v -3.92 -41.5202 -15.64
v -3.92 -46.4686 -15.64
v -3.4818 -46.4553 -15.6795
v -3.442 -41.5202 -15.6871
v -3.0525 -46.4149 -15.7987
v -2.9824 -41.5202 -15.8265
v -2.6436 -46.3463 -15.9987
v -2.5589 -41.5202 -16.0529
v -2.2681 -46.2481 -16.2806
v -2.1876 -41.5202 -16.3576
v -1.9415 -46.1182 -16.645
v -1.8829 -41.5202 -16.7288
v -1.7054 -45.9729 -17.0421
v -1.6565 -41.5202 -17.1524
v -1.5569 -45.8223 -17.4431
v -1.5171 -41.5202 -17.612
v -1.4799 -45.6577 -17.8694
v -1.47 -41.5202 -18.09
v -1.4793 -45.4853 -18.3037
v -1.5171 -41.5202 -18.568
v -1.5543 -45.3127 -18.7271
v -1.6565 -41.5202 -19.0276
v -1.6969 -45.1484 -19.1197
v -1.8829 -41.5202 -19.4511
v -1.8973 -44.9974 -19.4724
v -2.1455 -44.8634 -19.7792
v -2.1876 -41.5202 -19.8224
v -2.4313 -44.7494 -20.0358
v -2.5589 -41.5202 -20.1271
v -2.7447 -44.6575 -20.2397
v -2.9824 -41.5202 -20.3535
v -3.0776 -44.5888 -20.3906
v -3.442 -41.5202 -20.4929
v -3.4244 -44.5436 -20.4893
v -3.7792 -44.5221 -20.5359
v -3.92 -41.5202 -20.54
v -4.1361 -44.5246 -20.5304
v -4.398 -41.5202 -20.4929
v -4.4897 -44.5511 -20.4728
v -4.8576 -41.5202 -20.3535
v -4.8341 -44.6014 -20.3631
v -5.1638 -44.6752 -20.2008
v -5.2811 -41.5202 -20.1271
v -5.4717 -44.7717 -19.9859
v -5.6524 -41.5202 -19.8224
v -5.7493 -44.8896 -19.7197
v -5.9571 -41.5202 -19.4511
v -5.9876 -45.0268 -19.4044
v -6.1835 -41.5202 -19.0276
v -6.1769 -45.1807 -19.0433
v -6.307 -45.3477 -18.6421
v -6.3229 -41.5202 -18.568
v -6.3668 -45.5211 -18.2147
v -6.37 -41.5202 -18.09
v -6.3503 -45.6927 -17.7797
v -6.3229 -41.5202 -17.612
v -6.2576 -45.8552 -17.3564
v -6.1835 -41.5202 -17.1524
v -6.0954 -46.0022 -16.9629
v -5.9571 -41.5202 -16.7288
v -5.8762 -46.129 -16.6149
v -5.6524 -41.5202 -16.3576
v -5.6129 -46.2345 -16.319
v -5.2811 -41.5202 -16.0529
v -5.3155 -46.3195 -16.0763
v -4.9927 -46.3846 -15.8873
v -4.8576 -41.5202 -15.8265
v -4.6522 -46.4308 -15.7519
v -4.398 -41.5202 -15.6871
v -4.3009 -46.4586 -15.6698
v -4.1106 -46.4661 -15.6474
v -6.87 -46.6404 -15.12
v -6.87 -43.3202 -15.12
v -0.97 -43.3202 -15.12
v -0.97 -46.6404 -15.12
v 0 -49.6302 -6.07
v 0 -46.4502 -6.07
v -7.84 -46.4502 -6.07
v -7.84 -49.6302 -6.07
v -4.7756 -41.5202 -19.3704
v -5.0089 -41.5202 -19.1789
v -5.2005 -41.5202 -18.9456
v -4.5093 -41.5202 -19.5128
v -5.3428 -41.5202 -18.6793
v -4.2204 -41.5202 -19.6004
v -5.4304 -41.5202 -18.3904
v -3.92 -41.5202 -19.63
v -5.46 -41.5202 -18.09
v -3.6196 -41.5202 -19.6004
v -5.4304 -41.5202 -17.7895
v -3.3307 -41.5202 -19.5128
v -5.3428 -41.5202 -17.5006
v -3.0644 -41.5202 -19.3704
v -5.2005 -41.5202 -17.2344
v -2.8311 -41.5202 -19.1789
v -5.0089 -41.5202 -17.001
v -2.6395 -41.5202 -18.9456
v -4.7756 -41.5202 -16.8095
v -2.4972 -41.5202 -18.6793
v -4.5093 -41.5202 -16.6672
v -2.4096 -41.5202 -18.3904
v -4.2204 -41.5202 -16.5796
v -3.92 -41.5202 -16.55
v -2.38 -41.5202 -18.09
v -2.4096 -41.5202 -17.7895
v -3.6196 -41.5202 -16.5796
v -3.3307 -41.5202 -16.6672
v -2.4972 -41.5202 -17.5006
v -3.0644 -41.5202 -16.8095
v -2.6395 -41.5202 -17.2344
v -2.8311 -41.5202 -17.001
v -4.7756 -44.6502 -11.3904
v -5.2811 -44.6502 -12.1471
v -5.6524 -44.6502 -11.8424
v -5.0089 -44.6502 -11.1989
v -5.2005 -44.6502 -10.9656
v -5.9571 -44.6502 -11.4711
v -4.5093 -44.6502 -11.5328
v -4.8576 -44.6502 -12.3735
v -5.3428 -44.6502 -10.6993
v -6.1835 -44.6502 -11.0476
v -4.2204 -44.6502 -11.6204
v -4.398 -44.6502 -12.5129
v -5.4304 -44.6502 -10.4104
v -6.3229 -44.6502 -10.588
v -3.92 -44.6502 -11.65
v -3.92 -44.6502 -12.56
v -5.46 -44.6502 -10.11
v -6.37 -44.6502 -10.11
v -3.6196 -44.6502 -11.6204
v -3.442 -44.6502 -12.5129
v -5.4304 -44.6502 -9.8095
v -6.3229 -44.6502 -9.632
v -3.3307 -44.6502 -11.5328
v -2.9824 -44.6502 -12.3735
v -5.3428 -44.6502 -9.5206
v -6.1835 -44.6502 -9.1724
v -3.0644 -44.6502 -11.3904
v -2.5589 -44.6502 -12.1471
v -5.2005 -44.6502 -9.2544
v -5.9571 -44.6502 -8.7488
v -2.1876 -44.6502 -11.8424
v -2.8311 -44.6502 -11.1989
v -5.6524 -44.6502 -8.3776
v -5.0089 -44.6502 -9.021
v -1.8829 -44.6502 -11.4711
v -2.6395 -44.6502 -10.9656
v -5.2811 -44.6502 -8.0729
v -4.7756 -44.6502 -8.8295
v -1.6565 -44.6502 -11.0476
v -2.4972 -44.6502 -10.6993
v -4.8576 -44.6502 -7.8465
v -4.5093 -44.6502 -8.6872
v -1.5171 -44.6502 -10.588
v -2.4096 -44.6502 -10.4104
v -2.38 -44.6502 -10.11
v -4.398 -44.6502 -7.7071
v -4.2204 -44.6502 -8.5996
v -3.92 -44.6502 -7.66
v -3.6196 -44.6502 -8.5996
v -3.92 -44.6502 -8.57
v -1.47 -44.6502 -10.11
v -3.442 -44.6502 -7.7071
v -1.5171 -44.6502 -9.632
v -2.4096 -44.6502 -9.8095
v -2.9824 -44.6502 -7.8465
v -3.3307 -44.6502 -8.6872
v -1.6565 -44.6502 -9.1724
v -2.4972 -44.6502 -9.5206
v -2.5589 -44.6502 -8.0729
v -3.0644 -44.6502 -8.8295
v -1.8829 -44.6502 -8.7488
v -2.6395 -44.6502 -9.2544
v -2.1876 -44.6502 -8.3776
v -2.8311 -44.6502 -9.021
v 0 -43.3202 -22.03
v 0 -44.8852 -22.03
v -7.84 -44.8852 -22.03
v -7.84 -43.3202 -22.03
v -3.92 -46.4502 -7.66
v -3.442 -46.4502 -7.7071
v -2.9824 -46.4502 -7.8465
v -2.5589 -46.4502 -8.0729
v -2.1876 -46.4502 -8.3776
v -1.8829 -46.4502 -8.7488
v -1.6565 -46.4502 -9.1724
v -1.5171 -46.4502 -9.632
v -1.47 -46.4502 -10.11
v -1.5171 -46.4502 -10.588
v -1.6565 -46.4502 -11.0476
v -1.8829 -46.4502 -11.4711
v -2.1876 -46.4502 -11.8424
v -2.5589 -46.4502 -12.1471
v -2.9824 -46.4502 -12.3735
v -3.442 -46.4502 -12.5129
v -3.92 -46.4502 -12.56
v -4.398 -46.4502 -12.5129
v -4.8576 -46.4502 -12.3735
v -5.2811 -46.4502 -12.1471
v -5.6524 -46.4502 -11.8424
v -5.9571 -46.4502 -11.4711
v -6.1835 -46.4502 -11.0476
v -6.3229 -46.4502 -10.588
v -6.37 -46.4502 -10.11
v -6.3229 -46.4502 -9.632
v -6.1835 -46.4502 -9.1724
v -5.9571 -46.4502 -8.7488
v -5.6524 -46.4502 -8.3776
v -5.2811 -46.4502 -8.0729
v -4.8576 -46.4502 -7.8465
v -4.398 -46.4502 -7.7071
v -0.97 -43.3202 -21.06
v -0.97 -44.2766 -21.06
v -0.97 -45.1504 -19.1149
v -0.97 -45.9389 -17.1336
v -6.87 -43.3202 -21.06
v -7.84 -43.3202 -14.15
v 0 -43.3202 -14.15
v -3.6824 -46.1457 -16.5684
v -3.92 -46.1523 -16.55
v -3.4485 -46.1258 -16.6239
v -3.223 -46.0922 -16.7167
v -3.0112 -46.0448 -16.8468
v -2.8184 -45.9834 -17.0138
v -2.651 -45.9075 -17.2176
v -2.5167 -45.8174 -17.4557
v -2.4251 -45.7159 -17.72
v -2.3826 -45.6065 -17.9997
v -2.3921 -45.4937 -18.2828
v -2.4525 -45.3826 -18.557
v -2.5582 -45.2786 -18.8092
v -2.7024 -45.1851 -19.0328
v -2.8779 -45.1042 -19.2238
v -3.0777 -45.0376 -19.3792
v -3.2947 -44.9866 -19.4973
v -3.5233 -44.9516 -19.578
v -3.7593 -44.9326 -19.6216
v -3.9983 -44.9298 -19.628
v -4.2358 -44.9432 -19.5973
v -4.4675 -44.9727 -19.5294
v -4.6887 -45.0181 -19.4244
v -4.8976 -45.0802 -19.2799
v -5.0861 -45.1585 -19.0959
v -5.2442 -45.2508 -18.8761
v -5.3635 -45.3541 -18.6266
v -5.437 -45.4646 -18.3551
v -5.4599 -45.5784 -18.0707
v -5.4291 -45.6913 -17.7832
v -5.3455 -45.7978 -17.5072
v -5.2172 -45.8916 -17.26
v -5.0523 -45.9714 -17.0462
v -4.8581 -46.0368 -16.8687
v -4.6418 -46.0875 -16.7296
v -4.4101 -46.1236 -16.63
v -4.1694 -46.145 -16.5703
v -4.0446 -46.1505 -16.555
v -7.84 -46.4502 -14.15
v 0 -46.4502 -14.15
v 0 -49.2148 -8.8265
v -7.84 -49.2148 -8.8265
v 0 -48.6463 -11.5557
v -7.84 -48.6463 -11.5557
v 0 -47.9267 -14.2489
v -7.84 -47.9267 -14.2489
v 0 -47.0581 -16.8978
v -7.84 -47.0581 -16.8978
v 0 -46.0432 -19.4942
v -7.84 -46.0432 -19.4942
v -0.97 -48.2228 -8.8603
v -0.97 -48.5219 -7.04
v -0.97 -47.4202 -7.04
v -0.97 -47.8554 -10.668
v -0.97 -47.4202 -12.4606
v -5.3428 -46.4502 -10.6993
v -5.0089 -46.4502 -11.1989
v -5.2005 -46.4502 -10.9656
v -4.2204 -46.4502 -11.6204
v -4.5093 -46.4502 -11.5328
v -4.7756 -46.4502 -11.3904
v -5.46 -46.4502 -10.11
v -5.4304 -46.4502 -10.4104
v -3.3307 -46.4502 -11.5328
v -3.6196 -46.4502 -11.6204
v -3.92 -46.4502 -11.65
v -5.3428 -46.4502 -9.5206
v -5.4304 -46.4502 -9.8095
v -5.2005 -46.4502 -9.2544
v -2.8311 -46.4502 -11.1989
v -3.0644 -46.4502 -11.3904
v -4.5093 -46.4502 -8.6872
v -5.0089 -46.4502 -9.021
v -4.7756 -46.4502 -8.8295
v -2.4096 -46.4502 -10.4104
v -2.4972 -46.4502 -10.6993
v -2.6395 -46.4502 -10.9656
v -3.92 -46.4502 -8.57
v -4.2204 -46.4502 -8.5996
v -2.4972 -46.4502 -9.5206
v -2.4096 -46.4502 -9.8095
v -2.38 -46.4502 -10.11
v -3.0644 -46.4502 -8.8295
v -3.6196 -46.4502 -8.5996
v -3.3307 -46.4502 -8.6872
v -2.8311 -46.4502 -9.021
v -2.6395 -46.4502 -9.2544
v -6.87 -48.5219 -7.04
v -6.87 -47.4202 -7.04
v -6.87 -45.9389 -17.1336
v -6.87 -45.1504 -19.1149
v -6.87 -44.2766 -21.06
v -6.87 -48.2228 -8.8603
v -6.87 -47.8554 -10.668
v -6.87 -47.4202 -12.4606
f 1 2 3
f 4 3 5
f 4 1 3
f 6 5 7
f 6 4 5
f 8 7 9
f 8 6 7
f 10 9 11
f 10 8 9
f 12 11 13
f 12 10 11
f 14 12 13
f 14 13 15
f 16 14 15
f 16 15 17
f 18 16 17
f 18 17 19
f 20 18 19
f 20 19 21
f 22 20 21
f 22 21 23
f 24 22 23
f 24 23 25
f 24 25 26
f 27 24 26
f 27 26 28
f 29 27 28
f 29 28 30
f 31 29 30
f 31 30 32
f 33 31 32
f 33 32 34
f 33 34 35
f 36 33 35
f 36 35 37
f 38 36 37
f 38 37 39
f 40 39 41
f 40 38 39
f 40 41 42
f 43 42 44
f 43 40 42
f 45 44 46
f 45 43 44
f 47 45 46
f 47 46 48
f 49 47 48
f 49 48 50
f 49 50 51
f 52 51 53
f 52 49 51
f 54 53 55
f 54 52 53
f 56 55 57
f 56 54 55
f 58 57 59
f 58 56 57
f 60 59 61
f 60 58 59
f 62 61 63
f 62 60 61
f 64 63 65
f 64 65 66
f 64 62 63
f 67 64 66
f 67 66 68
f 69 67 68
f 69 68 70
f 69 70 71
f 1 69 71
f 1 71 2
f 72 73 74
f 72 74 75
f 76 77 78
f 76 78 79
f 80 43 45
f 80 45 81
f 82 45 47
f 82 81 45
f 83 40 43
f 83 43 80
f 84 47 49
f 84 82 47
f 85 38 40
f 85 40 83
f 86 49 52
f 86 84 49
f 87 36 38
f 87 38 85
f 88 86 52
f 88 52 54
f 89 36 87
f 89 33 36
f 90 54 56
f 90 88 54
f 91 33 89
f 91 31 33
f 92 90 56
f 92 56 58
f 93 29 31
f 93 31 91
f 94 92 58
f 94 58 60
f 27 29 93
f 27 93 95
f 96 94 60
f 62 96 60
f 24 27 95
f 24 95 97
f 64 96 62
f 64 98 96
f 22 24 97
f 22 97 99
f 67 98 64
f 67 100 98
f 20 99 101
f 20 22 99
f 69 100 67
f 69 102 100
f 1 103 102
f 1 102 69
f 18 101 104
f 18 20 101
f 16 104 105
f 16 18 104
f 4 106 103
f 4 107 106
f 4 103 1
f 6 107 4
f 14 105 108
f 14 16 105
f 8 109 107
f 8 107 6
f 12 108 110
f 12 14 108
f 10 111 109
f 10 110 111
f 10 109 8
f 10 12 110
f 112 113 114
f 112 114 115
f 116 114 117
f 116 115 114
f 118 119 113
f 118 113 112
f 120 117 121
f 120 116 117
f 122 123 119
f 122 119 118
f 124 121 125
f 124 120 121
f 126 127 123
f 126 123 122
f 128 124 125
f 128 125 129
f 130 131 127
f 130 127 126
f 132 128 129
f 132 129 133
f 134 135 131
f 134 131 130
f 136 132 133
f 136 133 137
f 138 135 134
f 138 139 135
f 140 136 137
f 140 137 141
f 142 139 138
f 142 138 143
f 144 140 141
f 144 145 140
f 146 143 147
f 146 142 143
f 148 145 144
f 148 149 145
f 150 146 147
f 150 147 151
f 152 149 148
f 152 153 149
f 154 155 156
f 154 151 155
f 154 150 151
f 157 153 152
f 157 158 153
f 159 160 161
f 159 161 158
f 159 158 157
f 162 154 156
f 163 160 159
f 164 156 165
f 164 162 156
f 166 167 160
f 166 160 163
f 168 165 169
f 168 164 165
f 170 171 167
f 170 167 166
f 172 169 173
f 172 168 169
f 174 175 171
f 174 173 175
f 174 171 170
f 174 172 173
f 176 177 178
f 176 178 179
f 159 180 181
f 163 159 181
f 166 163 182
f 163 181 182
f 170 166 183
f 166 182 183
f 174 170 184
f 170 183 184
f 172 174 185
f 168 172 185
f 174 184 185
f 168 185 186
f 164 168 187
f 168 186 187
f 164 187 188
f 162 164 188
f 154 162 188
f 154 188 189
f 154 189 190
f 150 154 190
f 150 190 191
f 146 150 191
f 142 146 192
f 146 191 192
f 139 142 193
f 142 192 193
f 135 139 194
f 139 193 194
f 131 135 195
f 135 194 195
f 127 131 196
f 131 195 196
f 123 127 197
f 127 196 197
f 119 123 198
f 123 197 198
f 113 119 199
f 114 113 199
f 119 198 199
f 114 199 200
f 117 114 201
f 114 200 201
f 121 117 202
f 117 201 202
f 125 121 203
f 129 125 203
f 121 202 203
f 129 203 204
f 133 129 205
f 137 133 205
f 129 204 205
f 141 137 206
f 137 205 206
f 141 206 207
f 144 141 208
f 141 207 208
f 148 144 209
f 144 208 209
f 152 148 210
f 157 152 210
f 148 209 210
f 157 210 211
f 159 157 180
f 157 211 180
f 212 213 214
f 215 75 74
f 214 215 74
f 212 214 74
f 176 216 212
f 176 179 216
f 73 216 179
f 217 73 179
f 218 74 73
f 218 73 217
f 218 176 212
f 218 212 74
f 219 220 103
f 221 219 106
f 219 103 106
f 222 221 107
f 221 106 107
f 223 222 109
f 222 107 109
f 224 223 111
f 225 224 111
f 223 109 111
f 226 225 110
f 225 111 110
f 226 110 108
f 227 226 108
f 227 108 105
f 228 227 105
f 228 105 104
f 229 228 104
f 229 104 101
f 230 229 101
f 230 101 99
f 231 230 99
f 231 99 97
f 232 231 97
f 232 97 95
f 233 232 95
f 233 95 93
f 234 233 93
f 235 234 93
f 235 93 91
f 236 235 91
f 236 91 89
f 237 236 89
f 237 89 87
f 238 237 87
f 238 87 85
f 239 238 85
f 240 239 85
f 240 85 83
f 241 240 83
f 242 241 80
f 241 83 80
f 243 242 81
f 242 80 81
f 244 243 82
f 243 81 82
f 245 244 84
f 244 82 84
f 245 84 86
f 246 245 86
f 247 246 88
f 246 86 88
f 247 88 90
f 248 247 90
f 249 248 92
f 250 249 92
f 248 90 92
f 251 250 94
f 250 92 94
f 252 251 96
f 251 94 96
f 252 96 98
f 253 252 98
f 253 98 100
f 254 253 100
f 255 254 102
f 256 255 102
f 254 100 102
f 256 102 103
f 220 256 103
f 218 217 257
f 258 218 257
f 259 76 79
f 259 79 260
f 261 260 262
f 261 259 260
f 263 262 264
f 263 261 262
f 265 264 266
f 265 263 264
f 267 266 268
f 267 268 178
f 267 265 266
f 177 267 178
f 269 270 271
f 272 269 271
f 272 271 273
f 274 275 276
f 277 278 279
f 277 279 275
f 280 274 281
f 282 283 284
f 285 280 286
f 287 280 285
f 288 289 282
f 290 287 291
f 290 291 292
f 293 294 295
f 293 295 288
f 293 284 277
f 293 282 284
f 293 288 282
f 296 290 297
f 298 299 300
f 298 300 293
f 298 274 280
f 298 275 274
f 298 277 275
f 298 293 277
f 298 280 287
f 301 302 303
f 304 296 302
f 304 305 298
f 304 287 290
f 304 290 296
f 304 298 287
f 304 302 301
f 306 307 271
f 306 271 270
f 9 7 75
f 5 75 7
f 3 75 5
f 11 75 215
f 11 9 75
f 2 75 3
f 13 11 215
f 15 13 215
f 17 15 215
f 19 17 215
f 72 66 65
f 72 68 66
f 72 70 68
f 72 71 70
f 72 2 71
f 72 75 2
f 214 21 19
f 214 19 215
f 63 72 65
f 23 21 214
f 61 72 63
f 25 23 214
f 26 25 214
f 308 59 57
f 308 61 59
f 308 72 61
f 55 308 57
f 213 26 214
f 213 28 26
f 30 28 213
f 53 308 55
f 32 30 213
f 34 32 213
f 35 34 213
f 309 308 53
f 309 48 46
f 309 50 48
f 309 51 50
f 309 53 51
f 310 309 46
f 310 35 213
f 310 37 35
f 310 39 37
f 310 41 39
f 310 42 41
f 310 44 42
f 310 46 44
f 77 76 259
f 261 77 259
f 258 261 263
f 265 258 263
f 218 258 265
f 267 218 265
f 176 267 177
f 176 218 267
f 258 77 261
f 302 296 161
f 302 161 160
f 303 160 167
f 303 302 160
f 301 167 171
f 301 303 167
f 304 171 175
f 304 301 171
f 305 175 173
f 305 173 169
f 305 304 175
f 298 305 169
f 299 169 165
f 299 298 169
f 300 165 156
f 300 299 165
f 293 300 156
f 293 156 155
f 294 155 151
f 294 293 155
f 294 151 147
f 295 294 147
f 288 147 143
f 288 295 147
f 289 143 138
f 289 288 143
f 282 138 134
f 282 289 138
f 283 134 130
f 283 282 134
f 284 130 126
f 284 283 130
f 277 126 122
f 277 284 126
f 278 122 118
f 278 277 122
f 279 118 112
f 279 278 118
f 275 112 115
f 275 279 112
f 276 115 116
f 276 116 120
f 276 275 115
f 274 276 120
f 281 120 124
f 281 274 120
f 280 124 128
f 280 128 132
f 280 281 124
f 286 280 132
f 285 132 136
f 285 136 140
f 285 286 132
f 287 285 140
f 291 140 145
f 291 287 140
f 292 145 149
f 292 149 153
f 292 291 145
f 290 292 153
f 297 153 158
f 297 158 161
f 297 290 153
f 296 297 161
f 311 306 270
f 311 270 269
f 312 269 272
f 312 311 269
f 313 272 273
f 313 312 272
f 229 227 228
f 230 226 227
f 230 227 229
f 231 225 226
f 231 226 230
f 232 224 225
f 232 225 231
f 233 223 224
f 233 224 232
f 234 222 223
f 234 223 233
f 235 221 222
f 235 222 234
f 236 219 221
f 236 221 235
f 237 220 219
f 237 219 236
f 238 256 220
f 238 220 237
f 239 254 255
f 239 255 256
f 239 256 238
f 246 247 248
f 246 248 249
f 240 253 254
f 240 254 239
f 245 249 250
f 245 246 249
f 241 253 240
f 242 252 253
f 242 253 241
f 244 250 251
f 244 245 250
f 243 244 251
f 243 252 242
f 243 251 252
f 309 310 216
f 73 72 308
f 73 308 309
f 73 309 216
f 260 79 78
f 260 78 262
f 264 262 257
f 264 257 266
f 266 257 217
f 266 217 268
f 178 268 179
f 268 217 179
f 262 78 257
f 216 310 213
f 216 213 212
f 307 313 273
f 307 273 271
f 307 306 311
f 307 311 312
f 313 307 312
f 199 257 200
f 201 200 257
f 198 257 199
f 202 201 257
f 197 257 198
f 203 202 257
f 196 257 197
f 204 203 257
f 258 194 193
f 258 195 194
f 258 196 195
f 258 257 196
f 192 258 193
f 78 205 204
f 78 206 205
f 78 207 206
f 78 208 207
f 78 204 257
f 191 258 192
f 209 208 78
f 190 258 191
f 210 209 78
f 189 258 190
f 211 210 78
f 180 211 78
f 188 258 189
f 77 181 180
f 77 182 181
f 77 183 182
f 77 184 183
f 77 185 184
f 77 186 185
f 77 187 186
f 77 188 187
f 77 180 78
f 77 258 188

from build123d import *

# Parameters (mm, degrees)
BOSS_EXTRUDE1_DEPTH      = 7.84
SHELL1_START             = -6.87
SHELL1_DEPTH             = 5.9
BOSS_EXTRUDE2_REACH      = 26.75
BOSS_EXTRUDE2_END_RADIUS = 49.03
SKETCH2_R                = 2.45
SKETCH2_R_2              = 1.54
SKETCH3_R                = 2.45
SKETCH3_R_2              = 1.54
BOSS_EXTRUDE3_DEPTH      = 1.8


# Read off the part's stored shape, not the designer's step: Shell1
with BuildPart() as part:
    # Sketch1 → Boss-Extrude1 (new body)
    with BuildSketch(Plane(origin=(0, 0, 0), x_dir=(0, 0, -1), z_dir=(1, 0, 0))):
        with BuildLine():
            Line((22.029982318, -44.885185519), (22.029982318, -43.320185519))
            Line((22.029982318, -43.320185519), (14.149982318, -43.320185519))
            Line((14.149982318, -43.320185519), (14.149982318, -46.450185519))
            Line((14.149982318, -46.450185519), (6.069982318, -46.450185519))
            Line((6.069982318, -46.450185519), (6.069982318, -49.630185519))
            ThreePointArc((6.069982318, -49.630185519), (14.24888625, -47.926706966), (22.029982318, -44.885185519))
        make_face()
    extrude(amount=-BOSS_EXTRUDE1_DEPTH)

    # Shell1 outline → Shell1 (cut)
    with BuildSketch(Plane.YZ.offset(SHELL1_START)):
        with BuildLine():
            Line((-43.320185519, -15.119982318), (-46.640401314, -15.119982318))
            ThreePointArc((-46.640401314, -15.119982318), (-45.555422953, -18.128550399), (-44.276608325, -21.059982318))
            Line((-44.276608325, -21.059982318), (-43.320185519, -21.059982318))
            Line((-43.320185519, -21.059982318), (-43.320185519, -15.119982318))
        make_face()
        with BuildLine():
            Line((-47.420185519, -7.039982318), (-48.521949146, -7.039982318))
            ThreePointArc((-48.521949146, -7.039982318), (-48.047571358, -9.765847969), (-47.420185519, -12.460614163))
            Line((-47.420185519, -12.460614163), (-47.420185519, -7.039982318))
        make_face()
    extrude(amount=SHELL1_DEPTH, mode=Mode.SUBTRACT)

    # Boss-Extrude2: up to this cylinder (the profile starts inside it)
    boss_extrude2_end = Plane(origin=(-3.92, 0, 0), z_dir=(1, 0, 0)) * Cylinder(BOSS_EXTRUDE2_END_RADIUS, 152.56, mode=Mode.PRIVATE)
    # Sketch2 → Boss-Extrude2 (add, up to the surface)
    with BuildSketch(Plane(origin=(0, -41.520185519, 0), x_dir=(1, 0, 0), z_dir=(0, 1, 0)), mode=Mode.PRIVATE) as boss_extrude2_sk1:
        with Locations(Location((-3.92, 18.089982318, 0), (0, 0, 270))):
            Circle(SKETCH2_R)
        with Locations(Location((-3.92, 18.089982318, 0), (0, 0, 270))):
            Circle(SKETCH2_R_2, mode=Mode.SUBTRACT)
    boss_extrude2_tool1 = extrude(boss_extrude2_sk1.sketch, amount=-BOSS_EXTRUDE2_REACH, mode=Mode.PRIVATE) & boss_extrude2_end
    add(boss_extrude2_tool1.solids().sort_by_distance((-3.92, -41.520186, -20.470686))[0])

    # Sketch3 → Boss-Extrude3 (add)
    with BuildSketch(Plane(origin=(0, -46.450185519, 0), x_dir=(1, 0, 0), z_dir=(0, 1, 0))):
        with Locations(Location((-3.92, 10.109982318, 0), (0, 0, 270))):
            Circle(SKETCH3_R)
        with Locations(Location((-3.92, 10.109982318, 0), (0, 0, 270))):
            Circle(SKETCH3_R_2, mode=Mode.SUBTRACT)
    extrude(amount=BOSS_EXTRUDE3_DEPTH)


solid = part.part
